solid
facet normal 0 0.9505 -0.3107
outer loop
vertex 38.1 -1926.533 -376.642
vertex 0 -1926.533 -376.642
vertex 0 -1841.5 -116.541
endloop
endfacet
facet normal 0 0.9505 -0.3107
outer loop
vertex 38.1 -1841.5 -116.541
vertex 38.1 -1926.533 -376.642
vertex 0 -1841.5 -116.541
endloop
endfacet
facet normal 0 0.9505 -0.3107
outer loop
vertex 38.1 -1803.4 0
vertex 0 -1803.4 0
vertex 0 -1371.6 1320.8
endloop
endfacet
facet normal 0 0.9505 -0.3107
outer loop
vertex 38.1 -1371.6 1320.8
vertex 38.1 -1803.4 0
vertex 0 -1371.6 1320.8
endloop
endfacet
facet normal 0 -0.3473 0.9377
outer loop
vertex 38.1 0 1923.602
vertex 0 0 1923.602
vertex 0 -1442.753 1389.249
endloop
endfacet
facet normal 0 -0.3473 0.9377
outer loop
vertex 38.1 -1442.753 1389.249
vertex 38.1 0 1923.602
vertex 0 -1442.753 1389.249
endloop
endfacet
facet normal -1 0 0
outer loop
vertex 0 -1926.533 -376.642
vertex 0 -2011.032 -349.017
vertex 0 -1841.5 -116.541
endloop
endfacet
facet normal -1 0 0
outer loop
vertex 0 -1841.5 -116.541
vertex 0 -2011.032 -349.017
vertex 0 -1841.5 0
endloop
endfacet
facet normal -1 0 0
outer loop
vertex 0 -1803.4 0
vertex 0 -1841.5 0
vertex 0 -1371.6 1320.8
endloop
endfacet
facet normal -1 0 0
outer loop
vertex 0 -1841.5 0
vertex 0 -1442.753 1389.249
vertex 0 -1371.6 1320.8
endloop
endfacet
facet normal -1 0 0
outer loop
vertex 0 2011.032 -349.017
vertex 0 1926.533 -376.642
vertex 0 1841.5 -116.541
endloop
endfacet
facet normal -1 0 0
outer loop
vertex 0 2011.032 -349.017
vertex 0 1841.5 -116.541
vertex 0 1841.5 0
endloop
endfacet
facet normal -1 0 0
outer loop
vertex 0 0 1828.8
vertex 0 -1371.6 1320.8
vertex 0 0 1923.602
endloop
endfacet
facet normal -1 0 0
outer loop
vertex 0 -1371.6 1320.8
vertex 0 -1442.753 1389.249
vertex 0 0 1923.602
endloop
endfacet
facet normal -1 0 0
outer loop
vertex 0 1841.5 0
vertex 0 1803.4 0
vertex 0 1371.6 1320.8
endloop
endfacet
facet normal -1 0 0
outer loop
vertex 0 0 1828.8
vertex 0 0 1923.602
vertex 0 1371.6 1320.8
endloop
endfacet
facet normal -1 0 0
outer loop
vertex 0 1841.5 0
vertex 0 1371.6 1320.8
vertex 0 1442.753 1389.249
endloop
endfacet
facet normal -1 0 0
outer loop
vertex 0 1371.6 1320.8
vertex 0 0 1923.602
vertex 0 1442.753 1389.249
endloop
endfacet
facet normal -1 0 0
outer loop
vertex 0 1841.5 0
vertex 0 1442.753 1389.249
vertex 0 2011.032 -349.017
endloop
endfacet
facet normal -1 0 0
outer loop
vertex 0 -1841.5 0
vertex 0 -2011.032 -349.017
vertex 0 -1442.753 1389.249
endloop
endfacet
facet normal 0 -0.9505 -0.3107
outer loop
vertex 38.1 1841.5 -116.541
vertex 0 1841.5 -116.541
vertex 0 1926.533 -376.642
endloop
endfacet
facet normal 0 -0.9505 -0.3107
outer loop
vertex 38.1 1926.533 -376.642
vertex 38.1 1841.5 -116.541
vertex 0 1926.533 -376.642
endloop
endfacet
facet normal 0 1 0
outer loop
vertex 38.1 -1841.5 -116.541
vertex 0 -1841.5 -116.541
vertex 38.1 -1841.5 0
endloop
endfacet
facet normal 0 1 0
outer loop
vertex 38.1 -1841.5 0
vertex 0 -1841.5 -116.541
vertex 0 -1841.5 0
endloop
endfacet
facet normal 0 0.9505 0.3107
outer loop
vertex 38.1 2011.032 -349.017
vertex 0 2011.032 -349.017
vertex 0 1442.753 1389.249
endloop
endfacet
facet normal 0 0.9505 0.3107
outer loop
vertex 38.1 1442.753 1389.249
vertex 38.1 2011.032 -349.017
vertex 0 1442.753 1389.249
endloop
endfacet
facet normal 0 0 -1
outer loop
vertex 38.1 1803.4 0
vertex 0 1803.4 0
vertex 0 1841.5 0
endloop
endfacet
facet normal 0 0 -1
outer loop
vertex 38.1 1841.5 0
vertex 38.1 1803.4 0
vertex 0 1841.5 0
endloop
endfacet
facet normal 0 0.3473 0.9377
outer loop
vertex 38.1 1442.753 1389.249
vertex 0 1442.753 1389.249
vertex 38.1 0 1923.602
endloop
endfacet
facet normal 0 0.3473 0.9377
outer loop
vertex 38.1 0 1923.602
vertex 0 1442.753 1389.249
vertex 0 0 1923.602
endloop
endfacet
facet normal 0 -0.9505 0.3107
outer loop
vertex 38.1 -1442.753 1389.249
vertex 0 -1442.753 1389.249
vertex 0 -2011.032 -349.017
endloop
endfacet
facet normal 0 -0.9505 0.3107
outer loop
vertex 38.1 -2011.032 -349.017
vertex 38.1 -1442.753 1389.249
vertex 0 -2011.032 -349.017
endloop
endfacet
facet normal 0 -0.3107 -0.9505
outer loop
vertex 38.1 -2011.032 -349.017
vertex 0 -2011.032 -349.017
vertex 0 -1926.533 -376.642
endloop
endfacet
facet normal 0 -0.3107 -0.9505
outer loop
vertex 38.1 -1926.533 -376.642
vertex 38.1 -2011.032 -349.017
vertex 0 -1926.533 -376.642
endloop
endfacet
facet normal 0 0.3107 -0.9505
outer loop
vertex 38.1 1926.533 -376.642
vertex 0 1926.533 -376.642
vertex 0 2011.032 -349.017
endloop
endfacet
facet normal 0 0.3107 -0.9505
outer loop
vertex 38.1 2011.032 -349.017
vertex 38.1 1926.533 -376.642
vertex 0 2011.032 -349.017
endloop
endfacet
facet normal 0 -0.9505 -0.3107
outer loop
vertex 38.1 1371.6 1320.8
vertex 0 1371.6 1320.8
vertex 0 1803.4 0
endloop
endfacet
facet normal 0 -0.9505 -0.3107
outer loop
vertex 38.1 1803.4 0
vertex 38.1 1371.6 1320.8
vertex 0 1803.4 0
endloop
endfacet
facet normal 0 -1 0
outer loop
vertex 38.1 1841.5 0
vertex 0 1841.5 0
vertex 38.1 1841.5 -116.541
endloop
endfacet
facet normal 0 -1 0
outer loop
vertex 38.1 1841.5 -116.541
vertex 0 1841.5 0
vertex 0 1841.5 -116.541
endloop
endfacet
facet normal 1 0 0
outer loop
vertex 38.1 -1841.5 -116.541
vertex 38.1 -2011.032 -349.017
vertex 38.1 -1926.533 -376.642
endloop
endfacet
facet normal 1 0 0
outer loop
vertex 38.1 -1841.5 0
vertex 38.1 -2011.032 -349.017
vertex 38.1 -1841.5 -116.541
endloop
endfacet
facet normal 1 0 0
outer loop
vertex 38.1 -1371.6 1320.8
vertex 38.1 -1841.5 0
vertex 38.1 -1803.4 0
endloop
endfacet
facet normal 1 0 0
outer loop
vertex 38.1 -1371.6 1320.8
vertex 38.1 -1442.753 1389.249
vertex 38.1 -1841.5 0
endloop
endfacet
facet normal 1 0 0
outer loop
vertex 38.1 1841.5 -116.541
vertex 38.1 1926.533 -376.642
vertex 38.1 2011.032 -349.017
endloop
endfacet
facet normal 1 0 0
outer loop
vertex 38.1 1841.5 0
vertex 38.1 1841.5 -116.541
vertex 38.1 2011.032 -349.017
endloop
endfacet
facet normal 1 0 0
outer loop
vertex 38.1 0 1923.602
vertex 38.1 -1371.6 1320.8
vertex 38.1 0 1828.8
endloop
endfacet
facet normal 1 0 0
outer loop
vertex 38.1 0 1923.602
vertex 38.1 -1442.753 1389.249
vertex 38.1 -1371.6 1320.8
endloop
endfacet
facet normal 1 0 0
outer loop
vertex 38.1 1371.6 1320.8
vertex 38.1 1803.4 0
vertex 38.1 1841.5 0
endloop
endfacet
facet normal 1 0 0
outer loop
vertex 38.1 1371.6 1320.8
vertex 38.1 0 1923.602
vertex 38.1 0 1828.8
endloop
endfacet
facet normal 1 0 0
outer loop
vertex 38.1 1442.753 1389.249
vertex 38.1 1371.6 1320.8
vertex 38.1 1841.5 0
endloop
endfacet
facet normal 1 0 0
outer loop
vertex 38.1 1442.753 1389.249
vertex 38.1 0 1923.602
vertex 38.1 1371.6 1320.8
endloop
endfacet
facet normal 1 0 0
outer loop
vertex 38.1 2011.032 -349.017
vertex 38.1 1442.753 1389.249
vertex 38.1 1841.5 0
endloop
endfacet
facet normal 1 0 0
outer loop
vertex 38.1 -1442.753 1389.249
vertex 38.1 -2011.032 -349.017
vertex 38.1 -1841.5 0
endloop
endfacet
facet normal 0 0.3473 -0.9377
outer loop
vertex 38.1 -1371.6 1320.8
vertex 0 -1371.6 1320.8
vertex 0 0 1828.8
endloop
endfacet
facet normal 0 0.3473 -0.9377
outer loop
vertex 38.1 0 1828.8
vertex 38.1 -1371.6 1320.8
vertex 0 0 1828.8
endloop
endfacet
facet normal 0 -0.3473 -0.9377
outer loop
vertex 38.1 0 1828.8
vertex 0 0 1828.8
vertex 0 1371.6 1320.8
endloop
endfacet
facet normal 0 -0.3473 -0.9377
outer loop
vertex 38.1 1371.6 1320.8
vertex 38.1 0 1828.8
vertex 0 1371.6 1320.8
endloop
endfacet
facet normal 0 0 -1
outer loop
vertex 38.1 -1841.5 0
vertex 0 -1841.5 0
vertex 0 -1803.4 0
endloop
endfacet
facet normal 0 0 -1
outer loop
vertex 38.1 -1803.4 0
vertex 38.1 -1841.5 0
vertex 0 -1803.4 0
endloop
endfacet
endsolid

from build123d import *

# Parameters (mm, degrees)
F1_DEPTH = 38.1


with BuildPart() as f1:
    # F0 (on Right) → F1 (new body)
    with BuildSketch(Plane.YZ):
        Polygon((0, 1923.601512), (0, 1828.8), (1371.6, 1320.8), (1803.4, 0), (1841.5, 0), (1841.5, -116.541176), (1926.532926, -376.64189), (2011.03196, -349.017206), (1442.75274, 1389.248645), align=None)
        Polygon((-1371.6, 1320.8), (0, 1828.8), (0, 1923.601512), (-1442.75274, 1389.248645), (-2011.03196, -349.017206), (-1926.532926, -376.64189), (-1841.5, -116.541176), (-1841.5, 0), (-1803.4, 0), align=None)
    extrude(amount=F1_DEPTH)


solid = f1.part
